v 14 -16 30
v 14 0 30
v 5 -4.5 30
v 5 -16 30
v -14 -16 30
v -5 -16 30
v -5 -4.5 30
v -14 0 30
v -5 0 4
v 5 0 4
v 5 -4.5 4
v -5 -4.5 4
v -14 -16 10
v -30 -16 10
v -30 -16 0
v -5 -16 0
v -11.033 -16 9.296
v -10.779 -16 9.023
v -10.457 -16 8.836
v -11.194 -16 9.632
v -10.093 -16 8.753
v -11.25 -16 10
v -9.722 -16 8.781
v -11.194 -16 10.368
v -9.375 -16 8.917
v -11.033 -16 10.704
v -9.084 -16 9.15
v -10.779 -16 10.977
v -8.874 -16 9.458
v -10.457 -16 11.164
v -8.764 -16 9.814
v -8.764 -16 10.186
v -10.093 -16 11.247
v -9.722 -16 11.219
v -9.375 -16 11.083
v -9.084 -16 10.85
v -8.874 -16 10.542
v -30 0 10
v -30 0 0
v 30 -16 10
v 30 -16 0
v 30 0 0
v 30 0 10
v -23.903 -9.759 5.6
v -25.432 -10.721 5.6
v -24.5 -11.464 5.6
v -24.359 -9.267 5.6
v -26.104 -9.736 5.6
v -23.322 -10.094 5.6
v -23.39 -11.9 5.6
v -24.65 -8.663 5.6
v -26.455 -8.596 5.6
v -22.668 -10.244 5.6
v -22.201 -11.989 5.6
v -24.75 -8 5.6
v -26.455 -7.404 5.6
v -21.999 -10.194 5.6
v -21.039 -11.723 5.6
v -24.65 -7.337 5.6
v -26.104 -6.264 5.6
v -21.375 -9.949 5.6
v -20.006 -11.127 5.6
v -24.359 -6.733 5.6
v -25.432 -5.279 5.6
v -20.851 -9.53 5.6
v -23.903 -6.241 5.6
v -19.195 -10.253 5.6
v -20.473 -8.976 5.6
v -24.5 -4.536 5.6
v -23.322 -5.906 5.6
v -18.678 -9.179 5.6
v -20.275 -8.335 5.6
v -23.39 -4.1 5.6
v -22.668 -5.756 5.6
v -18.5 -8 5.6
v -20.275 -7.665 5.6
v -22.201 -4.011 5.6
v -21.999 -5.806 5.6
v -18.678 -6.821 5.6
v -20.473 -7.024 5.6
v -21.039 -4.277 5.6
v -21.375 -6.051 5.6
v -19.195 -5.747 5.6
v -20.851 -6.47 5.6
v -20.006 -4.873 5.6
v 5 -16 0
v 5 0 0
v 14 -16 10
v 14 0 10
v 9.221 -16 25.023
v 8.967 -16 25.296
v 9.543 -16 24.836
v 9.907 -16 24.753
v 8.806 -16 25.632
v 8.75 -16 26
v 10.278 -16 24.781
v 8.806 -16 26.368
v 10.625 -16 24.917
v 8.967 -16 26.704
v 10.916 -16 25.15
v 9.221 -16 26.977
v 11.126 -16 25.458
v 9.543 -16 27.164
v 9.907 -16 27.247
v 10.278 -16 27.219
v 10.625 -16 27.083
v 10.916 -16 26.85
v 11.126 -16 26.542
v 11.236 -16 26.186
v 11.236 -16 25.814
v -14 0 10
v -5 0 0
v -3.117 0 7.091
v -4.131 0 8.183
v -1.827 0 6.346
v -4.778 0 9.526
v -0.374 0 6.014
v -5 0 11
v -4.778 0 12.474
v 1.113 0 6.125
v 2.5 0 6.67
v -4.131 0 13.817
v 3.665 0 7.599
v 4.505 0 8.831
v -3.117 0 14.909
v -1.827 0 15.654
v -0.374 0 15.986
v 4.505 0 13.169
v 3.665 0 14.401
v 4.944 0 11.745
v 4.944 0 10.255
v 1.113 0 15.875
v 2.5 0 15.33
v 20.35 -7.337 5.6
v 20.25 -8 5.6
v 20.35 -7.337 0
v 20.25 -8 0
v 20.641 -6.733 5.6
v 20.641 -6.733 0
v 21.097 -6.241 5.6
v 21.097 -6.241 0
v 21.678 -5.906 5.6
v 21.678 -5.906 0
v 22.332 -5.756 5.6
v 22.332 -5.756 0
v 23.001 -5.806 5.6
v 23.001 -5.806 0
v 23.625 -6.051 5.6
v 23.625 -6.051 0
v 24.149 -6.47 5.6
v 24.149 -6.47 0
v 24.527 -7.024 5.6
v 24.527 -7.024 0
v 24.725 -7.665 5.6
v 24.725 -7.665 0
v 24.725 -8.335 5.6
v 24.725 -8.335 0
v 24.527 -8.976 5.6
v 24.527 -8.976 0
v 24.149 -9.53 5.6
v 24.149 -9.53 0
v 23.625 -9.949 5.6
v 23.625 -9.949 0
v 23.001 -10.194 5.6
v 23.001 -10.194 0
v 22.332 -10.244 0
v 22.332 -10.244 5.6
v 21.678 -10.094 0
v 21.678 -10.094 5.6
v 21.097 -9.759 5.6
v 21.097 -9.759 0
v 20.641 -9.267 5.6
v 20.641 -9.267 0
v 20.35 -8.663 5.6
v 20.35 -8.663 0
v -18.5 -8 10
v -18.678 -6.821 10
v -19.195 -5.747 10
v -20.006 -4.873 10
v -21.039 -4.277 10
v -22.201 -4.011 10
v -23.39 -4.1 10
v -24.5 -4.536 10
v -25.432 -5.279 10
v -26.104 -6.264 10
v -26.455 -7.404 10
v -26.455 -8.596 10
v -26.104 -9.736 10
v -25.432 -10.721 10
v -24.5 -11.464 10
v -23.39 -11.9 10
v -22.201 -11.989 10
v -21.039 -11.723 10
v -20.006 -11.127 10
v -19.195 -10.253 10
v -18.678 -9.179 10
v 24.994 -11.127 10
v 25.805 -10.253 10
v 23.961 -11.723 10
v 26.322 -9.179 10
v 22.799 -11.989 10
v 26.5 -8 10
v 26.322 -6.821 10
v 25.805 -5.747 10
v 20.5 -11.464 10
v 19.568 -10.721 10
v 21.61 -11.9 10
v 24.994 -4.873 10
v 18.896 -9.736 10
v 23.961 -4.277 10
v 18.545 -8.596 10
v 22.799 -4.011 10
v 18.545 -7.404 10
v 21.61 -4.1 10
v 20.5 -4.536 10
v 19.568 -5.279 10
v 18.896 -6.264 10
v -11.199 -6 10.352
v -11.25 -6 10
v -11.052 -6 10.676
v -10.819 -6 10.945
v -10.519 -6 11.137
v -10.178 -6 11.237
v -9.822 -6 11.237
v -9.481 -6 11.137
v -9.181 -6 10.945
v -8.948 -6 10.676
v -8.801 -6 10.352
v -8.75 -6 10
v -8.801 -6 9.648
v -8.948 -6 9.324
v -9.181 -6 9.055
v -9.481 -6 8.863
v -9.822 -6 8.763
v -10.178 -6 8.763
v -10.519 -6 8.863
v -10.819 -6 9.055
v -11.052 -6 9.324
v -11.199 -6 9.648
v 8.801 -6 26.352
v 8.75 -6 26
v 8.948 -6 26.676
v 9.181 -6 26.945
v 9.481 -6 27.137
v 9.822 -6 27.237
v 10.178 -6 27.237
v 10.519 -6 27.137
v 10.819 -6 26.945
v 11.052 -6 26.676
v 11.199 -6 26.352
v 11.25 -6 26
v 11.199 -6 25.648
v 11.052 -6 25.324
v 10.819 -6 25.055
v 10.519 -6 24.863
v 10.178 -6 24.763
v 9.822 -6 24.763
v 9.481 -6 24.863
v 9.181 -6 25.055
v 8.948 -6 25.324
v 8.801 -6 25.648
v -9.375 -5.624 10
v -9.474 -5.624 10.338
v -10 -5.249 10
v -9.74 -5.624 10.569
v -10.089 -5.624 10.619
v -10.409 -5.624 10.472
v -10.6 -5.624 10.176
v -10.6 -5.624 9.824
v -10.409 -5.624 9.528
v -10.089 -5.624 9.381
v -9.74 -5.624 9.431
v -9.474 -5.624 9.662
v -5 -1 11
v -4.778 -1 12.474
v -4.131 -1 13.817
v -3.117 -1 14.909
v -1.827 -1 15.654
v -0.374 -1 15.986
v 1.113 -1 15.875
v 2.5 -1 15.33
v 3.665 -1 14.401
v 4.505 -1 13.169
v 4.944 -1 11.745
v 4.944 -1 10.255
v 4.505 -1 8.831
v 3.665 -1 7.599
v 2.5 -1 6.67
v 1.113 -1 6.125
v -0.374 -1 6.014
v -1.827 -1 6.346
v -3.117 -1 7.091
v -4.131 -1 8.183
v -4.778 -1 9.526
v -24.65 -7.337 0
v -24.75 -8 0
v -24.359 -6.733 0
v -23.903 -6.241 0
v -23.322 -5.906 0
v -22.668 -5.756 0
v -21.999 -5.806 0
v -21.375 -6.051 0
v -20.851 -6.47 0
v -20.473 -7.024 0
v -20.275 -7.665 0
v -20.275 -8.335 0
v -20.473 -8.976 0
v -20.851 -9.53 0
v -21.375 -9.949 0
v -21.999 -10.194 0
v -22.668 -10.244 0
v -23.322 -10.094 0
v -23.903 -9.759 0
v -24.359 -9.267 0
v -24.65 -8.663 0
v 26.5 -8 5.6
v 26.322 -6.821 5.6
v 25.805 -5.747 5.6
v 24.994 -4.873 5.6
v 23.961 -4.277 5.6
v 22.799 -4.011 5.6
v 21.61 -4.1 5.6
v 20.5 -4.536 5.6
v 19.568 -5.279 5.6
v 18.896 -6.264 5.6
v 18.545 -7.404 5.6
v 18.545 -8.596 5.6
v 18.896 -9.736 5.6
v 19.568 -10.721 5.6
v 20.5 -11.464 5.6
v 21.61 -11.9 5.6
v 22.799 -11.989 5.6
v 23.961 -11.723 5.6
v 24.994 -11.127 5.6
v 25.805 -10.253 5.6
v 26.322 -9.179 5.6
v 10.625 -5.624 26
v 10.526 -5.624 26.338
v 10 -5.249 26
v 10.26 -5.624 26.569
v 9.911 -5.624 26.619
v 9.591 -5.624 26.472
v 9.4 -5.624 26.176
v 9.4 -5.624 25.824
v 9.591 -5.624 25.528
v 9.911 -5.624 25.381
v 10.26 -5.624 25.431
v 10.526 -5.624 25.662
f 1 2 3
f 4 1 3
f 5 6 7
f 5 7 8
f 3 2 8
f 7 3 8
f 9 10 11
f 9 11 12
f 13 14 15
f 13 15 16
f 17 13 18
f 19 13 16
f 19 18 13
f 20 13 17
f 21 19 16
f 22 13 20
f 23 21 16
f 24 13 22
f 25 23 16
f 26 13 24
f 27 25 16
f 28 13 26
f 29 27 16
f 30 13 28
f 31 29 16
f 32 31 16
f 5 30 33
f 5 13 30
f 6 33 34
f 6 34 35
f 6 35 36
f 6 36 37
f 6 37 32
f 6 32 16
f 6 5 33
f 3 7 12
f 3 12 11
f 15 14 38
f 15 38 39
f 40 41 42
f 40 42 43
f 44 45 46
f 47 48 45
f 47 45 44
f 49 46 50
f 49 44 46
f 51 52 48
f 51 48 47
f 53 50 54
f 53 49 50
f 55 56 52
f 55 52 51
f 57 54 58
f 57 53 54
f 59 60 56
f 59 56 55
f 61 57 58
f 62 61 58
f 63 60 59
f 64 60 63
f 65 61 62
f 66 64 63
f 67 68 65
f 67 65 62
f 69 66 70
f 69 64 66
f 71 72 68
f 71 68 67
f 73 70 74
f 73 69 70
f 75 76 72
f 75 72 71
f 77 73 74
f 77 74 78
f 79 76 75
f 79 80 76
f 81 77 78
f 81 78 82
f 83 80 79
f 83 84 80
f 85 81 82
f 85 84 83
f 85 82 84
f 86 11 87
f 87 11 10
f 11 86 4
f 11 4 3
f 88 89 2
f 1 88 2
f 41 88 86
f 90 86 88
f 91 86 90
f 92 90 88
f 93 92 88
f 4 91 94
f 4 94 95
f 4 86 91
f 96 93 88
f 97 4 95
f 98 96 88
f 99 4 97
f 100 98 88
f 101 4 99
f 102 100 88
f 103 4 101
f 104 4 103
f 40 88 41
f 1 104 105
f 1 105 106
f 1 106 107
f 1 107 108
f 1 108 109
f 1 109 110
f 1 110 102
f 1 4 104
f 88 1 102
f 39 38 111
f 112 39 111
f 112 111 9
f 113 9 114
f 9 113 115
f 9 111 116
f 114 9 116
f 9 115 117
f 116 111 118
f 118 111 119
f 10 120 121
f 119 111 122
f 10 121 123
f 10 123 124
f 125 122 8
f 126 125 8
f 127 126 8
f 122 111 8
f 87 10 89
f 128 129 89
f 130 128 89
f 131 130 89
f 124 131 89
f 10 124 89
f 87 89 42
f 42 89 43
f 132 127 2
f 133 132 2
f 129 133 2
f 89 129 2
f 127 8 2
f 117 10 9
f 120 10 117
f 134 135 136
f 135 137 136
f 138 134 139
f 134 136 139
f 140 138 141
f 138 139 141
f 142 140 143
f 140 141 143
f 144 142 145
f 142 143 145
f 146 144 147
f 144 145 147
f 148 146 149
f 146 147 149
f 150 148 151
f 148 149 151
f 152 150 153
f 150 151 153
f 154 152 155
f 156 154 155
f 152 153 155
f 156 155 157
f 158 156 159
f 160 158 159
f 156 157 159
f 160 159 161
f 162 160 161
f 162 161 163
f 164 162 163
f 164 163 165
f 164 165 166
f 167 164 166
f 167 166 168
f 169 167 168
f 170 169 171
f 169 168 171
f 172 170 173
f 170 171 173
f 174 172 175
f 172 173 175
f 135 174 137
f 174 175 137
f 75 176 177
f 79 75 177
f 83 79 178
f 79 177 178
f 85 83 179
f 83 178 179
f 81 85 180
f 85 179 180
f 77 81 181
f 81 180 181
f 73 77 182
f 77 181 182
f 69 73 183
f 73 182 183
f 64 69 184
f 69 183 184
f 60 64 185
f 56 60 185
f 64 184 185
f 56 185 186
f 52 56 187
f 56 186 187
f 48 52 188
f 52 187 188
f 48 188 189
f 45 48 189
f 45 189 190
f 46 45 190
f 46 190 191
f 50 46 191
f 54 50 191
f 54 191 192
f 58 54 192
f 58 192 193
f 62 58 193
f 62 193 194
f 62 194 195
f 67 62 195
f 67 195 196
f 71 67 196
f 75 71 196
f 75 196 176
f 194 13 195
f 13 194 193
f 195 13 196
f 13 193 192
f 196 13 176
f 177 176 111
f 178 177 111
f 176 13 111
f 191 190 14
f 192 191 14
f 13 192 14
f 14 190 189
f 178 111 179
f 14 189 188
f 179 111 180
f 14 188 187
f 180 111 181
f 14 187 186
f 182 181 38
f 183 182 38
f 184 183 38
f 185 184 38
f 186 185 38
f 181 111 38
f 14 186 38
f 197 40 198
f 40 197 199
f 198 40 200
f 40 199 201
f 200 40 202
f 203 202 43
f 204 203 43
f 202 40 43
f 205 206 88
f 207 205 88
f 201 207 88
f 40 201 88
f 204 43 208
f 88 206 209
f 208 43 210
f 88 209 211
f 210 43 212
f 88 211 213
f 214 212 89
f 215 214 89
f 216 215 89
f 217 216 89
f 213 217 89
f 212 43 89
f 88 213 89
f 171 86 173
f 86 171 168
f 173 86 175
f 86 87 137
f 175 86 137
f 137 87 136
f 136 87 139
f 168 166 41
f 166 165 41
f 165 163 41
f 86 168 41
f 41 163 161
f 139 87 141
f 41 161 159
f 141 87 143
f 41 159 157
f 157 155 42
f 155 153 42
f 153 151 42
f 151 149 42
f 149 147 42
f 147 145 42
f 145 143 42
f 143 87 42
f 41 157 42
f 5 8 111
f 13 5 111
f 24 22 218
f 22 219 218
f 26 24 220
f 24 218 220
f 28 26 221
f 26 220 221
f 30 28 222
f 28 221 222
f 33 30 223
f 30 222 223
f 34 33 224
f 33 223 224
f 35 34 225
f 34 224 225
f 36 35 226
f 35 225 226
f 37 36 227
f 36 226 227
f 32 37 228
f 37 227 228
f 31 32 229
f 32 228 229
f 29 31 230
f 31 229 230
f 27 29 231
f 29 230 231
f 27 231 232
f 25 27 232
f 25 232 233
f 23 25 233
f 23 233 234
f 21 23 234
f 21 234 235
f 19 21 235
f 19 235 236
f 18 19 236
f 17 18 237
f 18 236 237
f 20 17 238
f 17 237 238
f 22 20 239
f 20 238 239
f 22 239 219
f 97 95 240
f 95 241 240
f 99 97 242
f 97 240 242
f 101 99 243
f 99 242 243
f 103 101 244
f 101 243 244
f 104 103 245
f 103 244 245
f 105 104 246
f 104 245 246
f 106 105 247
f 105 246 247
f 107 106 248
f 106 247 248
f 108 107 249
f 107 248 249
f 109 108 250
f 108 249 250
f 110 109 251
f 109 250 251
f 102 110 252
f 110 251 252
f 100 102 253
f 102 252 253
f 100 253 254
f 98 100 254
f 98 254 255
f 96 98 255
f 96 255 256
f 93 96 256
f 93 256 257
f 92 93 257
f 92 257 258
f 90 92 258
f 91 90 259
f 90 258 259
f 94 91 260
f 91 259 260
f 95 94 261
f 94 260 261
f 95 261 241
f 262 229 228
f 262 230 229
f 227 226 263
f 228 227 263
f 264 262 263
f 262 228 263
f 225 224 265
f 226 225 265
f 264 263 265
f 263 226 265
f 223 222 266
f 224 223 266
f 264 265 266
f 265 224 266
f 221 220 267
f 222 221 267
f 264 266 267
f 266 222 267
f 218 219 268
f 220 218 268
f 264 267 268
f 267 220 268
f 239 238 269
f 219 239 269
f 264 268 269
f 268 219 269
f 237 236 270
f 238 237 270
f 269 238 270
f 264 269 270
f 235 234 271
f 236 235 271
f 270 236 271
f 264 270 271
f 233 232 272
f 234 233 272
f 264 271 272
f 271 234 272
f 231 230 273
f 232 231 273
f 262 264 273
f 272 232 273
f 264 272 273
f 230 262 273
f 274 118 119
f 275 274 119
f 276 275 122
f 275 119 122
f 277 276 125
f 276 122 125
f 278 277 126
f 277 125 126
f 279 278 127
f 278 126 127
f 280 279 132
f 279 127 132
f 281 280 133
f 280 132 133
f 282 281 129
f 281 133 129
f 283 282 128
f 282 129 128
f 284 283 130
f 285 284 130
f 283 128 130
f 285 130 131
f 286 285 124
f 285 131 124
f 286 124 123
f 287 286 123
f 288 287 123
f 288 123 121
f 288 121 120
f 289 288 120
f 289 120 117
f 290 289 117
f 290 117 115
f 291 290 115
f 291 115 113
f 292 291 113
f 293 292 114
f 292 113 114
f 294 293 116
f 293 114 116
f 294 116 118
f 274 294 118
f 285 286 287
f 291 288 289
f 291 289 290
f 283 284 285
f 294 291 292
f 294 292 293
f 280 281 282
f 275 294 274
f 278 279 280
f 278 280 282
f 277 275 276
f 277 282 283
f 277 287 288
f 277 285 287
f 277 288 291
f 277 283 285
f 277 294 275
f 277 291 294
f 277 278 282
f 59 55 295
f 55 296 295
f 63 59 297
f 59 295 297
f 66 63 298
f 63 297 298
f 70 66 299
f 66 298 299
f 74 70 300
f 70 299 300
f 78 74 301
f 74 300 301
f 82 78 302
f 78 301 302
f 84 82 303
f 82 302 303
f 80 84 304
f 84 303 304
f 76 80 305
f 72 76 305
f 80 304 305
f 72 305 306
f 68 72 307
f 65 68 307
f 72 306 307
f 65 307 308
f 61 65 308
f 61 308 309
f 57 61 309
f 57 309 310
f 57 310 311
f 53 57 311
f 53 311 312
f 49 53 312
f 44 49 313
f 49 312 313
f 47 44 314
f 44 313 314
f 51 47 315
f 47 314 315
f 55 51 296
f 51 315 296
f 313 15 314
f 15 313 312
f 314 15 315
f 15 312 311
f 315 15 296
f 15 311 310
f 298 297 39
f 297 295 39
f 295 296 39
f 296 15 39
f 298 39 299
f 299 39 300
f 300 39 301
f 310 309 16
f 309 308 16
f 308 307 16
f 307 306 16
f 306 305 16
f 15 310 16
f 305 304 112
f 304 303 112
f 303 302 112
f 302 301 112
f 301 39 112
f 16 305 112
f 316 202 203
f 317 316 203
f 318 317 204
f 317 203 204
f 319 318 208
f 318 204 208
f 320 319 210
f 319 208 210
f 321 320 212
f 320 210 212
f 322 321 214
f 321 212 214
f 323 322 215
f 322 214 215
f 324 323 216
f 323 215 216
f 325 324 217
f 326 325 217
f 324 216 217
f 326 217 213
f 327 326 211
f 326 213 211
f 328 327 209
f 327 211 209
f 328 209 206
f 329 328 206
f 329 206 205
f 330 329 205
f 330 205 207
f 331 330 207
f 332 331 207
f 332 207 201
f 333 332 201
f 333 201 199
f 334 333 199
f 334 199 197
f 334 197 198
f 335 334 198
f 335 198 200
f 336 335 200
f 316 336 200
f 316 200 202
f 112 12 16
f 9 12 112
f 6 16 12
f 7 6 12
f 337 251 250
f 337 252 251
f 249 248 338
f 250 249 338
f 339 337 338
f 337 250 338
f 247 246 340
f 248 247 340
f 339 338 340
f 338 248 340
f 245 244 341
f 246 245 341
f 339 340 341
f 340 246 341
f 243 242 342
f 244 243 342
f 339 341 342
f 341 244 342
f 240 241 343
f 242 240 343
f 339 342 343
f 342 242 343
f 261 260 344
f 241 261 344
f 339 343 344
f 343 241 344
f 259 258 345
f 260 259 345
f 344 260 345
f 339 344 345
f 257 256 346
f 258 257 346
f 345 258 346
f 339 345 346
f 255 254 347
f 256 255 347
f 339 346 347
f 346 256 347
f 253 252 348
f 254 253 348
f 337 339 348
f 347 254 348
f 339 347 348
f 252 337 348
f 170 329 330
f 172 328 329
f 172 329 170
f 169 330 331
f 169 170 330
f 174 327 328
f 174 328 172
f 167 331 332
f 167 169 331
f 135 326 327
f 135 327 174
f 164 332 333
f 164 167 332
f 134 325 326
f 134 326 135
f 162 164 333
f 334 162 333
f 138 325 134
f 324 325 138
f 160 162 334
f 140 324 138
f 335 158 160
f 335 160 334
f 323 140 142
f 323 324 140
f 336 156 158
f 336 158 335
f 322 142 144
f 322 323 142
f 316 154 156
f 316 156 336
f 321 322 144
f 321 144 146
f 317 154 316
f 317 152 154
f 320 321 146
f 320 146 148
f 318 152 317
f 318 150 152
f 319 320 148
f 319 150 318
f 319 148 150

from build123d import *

# Parameters (mm, degrees)
F1_DEPTH       = 16
F2_W           = 10
F2_H           = 11.5
F3_DEPTH       = 30.001
F4_W           = 10
F4_H           = 4
F5_DEPTH       = 16.001
F7_D           = 2.5
F7_DEPTH       = 10
F7_TIP         = 0.7510757738
F9_D           = 4.5
F9_DEPTH       = 10
F9_CBORE_D     = 8
F9_CBORE_DEPTH = 4.4
F9_TIP         = 1.3519363928
F10_R          = 5
F11_DEPTH      = 1


with BuildPart() as f1:
    # F0 (on Front) → F1 (new body)
    with BuildSketch(Plane.XZ):
        Polygon((14, 30), (0, 30), (-14, 30), (-14, 10), (-30, 10), (-30, 0), (0, 0), (30, 0), (30, 10), (14, 10), align=None)
    extrude(amount=F1_DEPTH)

    # F2 (on face) → F3 (cut, through all)
    with BuildSketch(Plane.XY.offset(30)):
        with Locations((0, -10.25)):
            Rectangle(F2_W, F2_H)
    extrude(amount=-F3_DEPTH, mode=Mode.SUBTRACT)

    # F4 (on face) → F5 (cut, through all)
    with BuildSketch(Plane(origin=(0, 0, 0), x_dir=(-1, 0, 0), z_dir=(0, 1, 0))):
        with Locations((0, 2)):
            Rectangle(F4_W, F4_H)
    extrude(amount=-F5_DEPTH, mode=Mode.SUBTRACT)

    # F7
    with Locations(Plane.XZ.offset(16)):
        with Locations((10, 26), (-10, 10)):
            Hole(F7_D / 2, depth=F7_DEPTH)
            with Locations((0, 0, -(F7_DEPTH + F7_TIP / 2))):  # 118° drill point
                Cone(0, F7_D / 2, F7_TIP, mode=Mode.SUBTRACT)

    # F9
    with Locations(Plane.XY.offset(10)):
        with Locations((22.5, -8), (-22.5, -8)):
            CounterBoreHole(F9_D / 2, F9_CBORE_D / 2, F9_CBORE_DEPTH, depth=F9_DEPTH)
            with Locations((0, 0, -(F9_DEPTH + F9_TIP / 2))):  # 118° drill point
                Cone(0, F9_D / 2, F9_TIP, mode=Mode.SUBTRACT)

    # F10 (on face) → F11 (cut)
    with BuildSketch(Plane(origin=(0, 0, 0), x_dir=(-1, 0, 0), z_dir=(0, 1, 0))):
        with Locations((0, 11)):
            Circle(F10_R)
    extrude(amount=-F11_DEPTH, mode=Mode.SUBTRACT)


solid = f1.part
